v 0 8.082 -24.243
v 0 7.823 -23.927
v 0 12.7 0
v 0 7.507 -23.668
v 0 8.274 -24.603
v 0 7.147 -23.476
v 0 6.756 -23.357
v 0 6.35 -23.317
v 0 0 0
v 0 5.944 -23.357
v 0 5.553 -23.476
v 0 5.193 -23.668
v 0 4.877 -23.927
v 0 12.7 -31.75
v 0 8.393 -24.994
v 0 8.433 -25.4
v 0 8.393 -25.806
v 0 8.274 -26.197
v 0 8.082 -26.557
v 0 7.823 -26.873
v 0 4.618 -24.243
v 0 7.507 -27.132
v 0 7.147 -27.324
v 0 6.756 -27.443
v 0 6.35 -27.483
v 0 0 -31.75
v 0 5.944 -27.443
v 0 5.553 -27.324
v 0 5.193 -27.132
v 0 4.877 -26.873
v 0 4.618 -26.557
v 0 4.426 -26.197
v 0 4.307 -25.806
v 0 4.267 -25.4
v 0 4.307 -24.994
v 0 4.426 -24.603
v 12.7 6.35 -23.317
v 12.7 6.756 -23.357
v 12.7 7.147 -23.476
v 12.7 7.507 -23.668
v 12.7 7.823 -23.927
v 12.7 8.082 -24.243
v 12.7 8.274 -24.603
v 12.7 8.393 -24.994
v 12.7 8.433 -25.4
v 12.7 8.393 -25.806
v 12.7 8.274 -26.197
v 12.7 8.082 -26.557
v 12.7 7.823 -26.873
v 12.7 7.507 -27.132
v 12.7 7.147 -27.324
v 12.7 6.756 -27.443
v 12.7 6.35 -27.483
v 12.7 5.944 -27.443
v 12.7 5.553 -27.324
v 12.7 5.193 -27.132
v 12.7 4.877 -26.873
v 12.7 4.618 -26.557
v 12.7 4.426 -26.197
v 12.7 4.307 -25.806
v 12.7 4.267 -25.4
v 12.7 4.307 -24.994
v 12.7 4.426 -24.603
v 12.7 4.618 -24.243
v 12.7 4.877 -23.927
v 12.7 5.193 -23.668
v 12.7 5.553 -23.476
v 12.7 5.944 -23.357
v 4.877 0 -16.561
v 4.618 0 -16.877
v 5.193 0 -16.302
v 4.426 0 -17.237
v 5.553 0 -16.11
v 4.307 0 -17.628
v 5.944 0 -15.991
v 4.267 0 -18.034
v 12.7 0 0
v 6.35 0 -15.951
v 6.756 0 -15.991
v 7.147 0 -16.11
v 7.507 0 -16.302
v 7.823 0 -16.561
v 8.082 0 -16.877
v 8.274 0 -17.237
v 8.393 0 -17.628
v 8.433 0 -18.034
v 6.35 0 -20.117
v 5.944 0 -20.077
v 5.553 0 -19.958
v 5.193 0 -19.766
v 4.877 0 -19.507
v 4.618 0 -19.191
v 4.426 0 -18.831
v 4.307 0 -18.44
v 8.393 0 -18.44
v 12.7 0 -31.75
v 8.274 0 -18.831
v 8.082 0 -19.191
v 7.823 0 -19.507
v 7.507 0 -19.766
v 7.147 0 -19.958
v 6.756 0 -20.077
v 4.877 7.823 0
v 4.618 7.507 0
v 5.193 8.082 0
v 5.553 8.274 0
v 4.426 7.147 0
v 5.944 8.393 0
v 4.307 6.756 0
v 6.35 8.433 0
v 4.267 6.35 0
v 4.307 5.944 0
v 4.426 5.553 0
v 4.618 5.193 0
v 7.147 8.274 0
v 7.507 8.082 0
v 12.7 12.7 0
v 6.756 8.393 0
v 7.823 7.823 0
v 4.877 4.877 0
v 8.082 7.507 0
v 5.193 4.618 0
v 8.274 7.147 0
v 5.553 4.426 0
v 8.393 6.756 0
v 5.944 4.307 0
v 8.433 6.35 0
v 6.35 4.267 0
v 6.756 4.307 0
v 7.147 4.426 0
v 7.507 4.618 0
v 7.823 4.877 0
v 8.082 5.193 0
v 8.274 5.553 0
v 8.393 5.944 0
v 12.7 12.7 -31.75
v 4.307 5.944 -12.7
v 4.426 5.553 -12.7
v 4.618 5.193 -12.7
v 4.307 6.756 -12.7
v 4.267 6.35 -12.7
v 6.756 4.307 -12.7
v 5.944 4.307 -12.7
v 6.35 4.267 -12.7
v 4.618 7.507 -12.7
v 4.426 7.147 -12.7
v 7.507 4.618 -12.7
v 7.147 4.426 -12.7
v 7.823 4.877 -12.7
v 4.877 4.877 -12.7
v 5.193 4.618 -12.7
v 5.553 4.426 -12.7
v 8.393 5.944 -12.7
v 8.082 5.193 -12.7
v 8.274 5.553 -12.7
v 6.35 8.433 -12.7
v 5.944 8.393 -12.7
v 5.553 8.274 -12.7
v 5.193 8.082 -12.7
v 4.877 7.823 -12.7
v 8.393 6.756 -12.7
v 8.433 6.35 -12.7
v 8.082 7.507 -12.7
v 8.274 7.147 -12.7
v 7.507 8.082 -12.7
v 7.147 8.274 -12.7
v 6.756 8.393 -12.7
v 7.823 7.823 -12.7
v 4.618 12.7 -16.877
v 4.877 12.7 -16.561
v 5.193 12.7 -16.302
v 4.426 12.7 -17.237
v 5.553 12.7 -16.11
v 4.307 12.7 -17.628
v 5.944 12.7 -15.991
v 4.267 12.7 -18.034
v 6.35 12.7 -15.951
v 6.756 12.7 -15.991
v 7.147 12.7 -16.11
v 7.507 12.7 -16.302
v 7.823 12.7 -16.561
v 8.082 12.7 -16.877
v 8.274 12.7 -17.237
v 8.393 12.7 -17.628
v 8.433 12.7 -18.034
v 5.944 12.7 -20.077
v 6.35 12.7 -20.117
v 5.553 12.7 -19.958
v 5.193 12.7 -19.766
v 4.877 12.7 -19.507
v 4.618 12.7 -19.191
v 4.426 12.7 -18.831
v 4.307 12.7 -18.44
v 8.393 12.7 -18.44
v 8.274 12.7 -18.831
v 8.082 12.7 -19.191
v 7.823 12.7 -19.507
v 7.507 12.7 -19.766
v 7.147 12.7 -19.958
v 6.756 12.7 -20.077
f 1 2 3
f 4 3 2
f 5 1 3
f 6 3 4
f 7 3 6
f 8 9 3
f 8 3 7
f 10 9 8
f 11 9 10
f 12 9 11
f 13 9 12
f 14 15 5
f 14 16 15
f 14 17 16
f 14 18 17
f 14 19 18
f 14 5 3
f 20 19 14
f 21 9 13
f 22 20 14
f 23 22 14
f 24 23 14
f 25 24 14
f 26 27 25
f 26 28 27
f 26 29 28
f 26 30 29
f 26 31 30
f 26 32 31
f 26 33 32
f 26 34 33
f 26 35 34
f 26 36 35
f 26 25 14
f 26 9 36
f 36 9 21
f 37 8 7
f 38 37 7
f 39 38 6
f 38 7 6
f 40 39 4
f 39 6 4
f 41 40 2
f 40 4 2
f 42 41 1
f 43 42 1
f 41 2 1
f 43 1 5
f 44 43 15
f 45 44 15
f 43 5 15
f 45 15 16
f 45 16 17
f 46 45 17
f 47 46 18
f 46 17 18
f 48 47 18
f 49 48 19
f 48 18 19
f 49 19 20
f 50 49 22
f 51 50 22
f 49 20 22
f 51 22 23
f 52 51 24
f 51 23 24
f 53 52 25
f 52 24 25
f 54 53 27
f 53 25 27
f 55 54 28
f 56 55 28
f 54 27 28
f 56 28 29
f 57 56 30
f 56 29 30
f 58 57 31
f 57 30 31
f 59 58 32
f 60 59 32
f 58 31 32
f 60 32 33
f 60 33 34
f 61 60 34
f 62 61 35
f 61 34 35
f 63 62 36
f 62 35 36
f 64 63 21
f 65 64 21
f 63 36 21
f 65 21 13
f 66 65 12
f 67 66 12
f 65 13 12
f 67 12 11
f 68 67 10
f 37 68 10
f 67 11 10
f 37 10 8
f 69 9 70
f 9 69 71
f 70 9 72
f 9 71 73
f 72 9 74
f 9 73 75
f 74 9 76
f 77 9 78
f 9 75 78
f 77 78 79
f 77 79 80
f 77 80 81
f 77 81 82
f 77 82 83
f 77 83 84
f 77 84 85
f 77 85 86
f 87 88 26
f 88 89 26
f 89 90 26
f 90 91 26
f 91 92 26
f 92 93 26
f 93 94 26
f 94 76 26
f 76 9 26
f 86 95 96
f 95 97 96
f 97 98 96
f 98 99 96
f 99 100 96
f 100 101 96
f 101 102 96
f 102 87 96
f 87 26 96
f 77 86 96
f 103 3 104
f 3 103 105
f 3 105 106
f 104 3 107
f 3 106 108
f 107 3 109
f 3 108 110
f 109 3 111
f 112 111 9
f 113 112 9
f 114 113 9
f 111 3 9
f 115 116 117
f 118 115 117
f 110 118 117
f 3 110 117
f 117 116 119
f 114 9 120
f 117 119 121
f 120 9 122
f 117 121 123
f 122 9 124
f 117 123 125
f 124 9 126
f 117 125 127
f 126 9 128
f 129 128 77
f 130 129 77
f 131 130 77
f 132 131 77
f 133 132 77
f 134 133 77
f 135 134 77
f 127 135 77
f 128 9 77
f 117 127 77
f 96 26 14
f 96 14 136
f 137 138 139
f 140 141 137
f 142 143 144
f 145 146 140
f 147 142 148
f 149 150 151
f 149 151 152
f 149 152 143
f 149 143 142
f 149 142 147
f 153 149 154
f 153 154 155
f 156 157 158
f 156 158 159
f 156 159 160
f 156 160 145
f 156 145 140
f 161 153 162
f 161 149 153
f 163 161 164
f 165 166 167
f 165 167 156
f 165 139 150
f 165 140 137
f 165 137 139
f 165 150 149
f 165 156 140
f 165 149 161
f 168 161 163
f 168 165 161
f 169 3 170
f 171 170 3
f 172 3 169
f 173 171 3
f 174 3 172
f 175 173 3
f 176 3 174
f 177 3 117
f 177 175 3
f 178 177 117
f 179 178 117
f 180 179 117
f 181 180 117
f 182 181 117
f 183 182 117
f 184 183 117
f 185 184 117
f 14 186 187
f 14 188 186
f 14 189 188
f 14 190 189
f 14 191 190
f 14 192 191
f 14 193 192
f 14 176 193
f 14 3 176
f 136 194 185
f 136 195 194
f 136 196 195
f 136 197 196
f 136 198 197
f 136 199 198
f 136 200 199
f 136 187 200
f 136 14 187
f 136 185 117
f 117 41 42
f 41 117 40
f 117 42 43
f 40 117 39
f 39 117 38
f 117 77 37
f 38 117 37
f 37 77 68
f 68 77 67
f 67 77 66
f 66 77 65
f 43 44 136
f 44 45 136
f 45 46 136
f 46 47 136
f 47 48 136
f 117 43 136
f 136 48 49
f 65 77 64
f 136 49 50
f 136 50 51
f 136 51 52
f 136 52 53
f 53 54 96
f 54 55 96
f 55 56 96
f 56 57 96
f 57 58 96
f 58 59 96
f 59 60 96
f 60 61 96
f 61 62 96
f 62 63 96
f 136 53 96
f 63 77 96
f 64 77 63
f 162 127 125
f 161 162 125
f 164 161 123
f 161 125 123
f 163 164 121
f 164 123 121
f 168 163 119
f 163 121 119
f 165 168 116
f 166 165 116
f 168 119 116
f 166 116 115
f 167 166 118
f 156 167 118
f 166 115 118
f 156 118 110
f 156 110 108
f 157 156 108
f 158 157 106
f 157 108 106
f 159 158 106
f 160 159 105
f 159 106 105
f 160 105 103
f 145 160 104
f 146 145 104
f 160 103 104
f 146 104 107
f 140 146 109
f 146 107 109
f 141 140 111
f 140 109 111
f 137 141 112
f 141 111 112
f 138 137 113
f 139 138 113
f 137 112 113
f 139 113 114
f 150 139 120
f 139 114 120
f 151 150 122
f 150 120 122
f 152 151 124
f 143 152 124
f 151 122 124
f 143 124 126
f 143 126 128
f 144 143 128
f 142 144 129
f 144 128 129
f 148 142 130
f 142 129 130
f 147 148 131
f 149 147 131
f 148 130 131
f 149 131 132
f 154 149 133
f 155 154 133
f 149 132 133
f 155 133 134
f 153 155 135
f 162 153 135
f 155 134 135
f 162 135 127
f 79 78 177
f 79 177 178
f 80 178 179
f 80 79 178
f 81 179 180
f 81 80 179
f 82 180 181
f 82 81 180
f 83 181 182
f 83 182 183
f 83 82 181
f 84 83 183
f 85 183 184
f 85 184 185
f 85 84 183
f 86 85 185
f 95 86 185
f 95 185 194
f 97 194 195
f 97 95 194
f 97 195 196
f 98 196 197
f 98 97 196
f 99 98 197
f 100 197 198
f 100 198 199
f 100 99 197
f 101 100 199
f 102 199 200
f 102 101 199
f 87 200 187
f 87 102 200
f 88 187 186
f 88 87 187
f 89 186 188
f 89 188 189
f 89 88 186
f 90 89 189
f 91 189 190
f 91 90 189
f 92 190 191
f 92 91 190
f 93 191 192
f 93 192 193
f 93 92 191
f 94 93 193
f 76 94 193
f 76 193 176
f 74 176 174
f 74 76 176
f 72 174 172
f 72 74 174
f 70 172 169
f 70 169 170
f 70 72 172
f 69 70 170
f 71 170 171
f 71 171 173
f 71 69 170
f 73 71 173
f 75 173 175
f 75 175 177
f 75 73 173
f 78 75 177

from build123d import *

# Parameters (mm, degrees)
SKETCH1_W           = 12.7
SKETCH1_H           = 31.75
SKETCH1_R           = 2.0828
BOSS_EXTRUDE1_DEPTH = 12.7
SKETCH2_R           = 2.0828
CUT_EXTRUDE1_DEPTH  = 12.7
SKETCH3_R           = 2.0828
CUT_EXTRUDE2_DEPTH  = 12.7


with BuildPart() as part:
    # Sketch1 → Boss-Extrude1 (new body)
    with BuildSketch(Plane(origin=(0, 0, 0), x_dir=(1, 0, 0), z_dir=(0, 1, 0))):
        with Locations((6.35, 15.875)):
            Rectangle(SKETCH1_W, SKETCH1_H)
        with Locations(Location((6.35, 18.034, 0), (0, 0, 270))):
            Circle(SKETCH1_R, mode=Mode.SUBTRACT)
    extrude(amount=BOSS_EXTRUDE1_DEPTH)

    # Sketch2 → Cut-Extrude1 (cut)
    with BuildSketch(Plane.XY):
        with Locations((6.35, 6.35)):
            Circle(SKETCH2_R)
    extrude(amount=-CUT_EXTRUDE1_DEPTH, mode=Mode.SUBTRACT)

    # Sketch3 → Cut-Extrude2 (cut)
    with BuildSketch(Plane.ZY):
        with Locations((-25.4, 6.35)):
            Circle(SKETCH3_R)
    extrude(amount=-CUT_EXTRUDE2_DEPTH, mode=Mode.SUBTRACT)


solid = part.part
